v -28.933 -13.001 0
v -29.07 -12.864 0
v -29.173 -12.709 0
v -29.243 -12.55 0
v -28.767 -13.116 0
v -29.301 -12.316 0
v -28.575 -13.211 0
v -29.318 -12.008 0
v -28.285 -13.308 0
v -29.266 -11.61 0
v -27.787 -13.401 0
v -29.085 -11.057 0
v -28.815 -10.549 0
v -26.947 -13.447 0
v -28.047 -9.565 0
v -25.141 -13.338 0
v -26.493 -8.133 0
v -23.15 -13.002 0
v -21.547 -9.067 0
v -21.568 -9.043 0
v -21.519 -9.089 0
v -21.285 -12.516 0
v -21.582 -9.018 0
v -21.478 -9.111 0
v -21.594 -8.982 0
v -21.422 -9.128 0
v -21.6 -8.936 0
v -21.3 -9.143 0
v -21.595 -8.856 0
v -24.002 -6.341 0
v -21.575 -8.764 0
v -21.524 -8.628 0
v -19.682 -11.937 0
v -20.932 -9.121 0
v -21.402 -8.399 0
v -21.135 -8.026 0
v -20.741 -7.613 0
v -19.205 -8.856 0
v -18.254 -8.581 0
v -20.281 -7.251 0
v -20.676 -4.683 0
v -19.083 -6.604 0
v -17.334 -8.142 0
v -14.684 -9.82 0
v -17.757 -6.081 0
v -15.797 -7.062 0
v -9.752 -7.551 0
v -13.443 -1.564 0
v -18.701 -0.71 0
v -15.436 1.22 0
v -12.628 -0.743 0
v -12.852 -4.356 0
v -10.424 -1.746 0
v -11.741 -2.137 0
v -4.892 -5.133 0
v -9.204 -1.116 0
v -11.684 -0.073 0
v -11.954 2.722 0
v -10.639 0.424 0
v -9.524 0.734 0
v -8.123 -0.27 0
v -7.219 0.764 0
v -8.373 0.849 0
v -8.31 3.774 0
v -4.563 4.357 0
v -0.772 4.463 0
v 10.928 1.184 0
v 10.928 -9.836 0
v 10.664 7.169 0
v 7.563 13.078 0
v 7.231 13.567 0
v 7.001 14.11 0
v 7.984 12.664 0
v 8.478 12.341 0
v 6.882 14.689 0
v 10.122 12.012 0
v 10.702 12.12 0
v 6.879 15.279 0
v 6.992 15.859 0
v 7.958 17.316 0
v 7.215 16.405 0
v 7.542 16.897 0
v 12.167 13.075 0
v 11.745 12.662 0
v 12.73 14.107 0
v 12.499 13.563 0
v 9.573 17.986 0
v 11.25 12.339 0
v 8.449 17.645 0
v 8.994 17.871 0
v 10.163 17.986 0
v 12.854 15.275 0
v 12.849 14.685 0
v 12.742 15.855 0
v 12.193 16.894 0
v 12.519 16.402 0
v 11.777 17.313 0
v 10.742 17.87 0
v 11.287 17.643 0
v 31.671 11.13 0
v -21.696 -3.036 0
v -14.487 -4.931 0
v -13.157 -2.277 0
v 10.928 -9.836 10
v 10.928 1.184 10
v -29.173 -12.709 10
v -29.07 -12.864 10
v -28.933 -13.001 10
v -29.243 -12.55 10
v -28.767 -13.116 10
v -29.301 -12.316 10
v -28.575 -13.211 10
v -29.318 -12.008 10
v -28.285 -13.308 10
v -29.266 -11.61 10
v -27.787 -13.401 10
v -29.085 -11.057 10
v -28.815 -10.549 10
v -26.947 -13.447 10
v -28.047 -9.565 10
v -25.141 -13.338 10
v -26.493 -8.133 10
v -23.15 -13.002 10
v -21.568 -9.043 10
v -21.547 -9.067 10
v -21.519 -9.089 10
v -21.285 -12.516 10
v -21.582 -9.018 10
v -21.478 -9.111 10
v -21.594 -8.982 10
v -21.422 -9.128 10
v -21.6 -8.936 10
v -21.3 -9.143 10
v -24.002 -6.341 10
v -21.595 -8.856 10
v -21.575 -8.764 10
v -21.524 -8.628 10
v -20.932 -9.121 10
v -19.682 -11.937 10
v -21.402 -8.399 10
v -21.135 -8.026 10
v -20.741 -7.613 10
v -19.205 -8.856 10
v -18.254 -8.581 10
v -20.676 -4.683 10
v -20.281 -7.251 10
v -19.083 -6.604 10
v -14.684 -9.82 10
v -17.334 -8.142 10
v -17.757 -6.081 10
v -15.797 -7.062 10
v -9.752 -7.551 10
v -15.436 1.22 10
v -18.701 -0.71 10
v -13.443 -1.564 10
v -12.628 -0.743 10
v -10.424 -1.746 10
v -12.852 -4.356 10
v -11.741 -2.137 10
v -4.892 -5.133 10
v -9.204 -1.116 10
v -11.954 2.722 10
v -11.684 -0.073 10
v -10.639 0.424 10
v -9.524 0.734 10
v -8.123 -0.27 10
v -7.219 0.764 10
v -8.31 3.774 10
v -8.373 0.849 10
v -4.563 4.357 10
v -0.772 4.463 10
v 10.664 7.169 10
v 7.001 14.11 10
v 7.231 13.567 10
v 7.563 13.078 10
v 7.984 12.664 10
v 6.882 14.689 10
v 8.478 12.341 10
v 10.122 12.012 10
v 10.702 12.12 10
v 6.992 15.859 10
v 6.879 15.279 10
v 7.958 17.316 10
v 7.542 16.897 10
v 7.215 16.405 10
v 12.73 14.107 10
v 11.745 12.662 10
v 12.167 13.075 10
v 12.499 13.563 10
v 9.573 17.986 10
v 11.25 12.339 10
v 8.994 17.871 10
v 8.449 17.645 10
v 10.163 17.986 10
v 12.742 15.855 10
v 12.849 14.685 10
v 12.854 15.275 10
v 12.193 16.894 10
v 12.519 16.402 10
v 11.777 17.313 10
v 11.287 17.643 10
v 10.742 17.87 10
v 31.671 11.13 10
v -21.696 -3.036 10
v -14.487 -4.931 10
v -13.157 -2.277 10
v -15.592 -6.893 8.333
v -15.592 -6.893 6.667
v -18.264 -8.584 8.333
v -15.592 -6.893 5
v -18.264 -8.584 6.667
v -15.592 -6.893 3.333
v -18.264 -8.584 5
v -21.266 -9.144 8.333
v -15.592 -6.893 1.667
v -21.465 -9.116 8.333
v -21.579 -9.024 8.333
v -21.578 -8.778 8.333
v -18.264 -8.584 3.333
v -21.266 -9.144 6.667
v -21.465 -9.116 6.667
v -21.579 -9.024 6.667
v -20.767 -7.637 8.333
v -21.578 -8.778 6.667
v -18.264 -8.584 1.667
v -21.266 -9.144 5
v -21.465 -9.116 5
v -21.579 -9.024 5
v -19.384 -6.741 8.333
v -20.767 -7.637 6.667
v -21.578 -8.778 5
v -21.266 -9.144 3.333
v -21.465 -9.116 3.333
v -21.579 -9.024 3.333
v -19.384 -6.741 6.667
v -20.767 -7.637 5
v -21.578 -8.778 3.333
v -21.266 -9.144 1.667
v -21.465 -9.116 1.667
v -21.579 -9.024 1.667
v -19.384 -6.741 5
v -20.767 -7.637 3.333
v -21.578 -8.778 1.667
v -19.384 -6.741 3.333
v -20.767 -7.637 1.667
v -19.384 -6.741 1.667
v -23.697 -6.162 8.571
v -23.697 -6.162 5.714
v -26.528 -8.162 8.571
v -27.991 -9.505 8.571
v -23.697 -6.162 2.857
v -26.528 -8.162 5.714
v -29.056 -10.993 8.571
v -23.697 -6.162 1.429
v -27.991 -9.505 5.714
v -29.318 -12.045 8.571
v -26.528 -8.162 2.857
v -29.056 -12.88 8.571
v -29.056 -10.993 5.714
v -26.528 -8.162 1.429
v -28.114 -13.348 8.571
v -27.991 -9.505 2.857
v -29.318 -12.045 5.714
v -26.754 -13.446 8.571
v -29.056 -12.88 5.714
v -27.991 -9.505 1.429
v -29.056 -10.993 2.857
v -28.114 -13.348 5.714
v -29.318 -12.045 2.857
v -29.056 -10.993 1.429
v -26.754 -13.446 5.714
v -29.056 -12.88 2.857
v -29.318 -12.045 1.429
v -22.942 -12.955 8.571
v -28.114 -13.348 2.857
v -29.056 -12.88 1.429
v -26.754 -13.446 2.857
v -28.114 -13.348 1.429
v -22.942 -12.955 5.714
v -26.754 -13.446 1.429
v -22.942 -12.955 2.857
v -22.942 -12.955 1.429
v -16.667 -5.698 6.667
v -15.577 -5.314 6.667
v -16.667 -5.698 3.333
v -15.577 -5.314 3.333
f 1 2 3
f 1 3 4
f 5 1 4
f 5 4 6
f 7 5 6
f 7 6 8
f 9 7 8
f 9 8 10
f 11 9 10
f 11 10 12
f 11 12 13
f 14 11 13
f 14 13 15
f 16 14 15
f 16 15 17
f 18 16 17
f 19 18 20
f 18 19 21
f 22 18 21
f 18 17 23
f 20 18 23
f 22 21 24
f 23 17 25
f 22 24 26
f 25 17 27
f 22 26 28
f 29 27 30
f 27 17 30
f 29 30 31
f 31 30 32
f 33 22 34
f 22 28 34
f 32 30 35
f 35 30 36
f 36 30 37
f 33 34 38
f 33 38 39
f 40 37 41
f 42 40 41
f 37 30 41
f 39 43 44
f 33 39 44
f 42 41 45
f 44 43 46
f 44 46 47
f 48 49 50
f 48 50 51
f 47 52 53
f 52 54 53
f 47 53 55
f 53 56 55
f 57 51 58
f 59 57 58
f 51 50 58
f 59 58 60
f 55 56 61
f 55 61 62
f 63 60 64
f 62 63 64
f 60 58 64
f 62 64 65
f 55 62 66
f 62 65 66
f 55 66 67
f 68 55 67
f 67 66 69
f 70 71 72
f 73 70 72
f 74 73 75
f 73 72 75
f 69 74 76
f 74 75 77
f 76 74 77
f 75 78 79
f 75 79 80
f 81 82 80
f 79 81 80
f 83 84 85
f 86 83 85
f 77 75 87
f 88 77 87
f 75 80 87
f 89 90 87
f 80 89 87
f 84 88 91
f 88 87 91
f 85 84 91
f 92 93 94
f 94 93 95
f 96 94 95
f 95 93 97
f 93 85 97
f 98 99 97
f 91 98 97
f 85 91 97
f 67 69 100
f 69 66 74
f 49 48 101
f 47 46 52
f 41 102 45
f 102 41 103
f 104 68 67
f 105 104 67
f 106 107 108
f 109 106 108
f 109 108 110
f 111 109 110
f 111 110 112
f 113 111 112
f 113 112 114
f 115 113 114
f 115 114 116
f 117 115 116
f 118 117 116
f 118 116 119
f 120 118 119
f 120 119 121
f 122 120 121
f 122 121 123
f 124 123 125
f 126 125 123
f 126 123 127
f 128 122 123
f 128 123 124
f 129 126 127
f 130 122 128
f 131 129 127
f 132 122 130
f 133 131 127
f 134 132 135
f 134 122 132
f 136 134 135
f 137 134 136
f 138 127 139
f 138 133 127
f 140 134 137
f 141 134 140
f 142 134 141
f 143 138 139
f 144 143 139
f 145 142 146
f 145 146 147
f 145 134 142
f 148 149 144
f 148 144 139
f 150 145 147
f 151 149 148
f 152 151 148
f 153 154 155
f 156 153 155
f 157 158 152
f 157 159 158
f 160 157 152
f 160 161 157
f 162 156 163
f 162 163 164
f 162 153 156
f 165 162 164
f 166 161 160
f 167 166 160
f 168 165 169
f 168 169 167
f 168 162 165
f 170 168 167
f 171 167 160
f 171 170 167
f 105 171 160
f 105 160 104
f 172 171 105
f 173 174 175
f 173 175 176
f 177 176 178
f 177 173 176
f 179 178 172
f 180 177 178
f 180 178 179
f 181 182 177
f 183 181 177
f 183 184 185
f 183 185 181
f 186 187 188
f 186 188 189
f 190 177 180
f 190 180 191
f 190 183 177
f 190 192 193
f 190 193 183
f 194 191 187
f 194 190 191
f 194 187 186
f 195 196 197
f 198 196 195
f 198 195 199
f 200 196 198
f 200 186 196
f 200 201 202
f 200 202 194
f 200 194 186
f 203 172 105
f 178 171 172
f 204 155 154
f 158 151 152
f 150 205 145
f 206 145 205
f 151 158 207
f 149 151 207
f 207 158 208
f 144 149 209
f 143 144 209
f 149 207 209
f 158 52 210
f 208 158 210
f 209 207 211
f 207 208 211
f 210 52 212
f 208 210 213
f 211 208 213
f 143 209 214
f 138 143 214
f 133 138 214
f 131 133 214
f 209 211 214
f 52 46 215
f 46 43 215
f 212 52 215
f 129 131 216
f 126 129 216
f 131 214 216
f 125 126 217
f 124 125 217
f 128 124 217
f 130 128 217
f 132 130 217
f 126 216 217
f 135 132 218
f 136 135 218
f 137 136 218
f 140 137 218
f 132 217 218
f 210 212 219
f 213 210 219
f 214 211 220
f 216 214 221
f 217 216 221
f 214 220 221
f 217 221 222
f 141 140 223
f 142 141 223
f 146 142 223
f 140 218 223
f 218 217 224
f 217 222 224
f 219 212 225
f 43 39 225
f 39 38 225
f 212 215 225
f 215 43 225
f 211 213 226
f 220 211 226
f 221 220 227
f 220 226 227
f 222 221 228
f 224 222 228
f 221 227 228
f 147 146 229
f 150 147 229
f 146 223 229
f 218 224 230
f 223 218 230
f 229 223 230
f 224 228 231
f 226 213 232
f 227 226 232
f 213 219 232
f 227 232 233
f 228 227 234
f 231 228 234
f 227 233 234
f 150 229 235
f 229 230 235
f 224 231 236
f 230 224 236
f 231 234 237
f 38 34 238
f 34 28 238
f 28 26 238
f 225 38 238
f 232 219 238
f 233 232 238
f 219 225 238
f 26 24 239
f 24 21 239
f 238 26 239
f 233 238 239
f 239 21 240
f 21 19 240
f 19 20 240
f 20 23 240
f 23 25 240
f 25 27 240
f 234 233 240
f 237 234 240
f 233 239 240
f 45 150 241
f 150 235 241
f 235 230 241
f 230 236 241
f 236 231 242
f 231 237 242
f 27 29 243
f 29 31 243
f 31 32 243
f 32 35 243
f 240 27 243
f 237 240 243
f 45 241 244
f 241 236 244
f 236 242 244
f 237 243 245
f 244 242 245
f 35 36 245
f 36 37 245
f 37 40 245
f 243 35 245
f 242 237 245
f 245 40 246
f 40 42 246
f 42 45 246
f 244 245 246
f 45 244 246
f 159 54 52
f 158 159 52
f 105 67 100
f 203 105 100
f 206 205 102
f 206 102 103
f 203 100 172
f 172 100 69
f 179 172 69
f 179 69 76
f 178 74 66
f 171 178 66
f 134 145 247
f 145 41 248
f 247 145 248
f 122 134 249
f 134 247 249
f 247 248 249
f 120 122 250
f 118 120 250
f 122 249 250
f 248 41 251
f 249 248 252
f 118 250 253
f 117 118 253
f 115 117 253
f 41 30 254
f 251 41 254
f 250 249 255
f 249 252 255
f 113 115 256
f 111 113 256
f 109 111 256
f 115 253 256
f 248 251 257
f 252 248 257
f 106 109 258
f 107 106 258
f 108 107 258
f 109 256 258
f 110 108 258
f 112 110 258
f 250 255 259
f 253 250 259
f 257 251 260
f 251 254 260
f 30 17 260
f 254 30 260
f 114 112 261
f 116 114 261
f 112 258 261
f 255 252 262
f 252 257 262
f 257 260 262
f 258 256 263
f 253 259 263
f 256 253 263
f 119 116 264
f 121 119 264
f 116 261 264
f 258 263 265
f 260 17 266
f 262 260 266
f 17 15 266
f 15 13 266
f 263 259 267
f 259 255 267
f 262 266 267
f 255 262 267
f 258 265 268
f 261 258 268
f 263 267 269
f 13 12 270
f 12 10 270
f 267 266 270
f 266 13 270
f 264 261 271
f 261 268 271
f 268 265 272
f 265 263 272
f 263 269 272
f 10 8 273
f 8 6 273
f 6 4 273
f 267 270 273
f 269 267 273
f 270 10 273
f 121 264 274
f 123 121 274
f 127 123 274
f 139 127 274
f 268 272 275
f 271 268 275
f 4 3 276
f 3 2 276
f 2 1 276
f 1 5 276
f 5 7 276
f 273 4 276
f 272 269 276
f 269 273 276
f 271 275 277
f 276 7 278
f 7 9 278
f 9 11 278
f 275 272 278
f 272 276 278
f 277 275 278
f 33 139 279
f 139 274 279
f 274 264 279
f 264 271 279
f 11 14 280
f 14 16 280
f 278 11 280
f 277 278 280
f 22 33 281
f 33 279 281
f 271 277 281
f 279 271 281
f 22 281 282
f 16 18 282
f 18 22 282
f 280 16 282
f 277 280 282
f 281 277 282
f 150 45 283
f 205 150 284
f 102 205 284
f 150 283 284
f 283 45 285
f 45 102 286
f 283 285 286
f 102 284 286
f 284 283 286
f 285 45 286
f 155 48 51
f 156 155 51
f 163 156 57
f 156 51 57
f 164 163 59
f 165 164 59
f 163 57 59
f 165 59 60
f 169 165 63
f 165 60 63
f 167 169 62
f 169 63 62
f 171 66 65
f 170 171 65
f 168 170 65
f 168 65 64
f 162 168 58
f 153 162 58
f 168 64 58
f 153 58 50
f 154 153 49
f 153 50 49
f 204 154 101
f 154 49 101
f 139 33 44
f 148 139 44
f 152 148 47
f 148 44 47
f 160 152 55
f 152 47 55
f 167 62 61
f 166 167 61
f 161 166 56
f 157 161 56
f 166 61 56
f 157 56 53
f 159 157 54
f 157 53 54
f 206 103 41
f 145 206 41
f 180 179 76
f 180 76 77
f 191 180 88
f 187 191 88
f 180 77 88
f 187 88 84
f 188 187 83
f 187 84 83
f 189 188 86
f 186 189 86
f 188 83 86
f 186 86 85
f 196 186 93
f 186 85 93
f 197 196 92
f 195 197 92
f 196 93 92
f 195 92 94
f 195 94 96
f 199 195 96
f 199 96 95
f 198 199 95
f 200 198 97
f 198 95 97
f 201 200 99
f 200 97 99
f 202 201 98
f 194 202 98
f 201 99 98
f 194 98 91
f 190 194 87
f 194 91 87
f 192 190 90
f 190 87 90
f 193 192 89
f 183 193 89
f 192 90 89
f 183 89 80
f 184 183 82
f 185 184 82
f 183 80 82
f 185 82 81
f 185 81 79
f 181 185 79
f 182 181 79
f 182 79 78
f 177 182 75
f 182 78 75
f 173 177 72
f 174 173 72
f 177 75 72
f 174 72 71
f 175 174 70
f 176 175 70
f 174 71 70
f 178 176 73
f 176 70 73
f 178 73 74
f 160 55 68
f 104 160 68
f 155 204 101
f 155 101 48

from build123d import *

# Parameters (mm, degrees)
F1_DEPTH = 10


with BuildPart() as f1:
    # F0 (on Top) → F1 (new body)
    with BuildSketch(Plane.XY):
        with BuildLine():
            Line((8.478207631, 12.3410948754), (-0.7716447129, 4.4630723743))
            ThreePointArc((-0.7716447129, 4.4630723743), (-11.9538408238, 2.7223708892), (-21.6962108707, -3.0359081413))
            Line((-21.6962108707, -3.0359081413), (-13.4434893382, -1.5644171497))
            ThreePointArc((-13.4434893382, -1.5644171497), (-10.6393236092, 0.4238918783), (-7.2186087971, 0.7636394335))
            ThreePointArc((-7.2186087971, 0.7636394335), (-9.2041796913, -1.1162314275), (-11.7406081274, -2.1374743066))
            Line((-11.7406081274, -2.1374743066), (-12.8516519005, -4.3556968285))
            add(Edge.make_bspline(
                [(-12.8516519005, -4.3556968285), (-13.7568916342, -5.2365663524), (-15.4952149852, -6.9280918184), (-18.1000884601, -8.7839051211), (-20.5113942152, -9.0591117823), (-21.9850725902, -9.2691445705), (-20.745626651, -7.1945055447), (-18.868340283, -6.495085517), (-17.7566145109, -6.0808901744)],
                knots=[0, 0, 0, 0, 0.2069867198, 0.3974746523, 0.566423919, 0.6670254821, 0.8028130608, 1, 1, 1, 1], degree=3))
            add(Edge.make_bspline(
                [(-17.7566145109, -6.0808901744), (-16.6666228197, -5.6975138753), (-15.5766311285, -5.3141375762), (-14.4866394373, -4.9307612771)],
                knots=[0, 0, 0, 0, 3.4663429522, 3.4663429522, 3.4663429522, 3.4663429522], degree=3))
            Line((-14.4866394373, -4.9307612771), (-13.1572225625, -2.2765522135))
            Line((-13.1572225625, -2.2765522135), (-20.6759641441, -4.6826065459))
            add(Edge.make_bspline(
                [(-20.6759641441, -4.6826065459), (-21.6949960064, -5.1413180449), (-23.7893254622, -6.0842111683), (-26.5134455561, -8.0502545567), (-29.3349164644, -10.6659635913), (-29.4655953345, -13.2765924141), (-26.5513052044, -13.5797258028), (-22.9693722214, -13.0632618836), (-20.6006690632, -12.3292936437), (-19.6821269664, -11.937062042)],
                knots=[0, 0, 0, 0, 0.1483192347, 0.2988701954, 0.4564156656, 0.5675018666, 0.6920148357, 0.8505478815, 1, 1, 1, 1], degree=3))
            ThreePointArc((-19.6821269664, -11.937062042), (-12.2092242102, -8.7042525804), (-4.8919349, -5.133172944))
            Line((-4.8919349, -5.133172944), (10.9284820036, -9.8356416623))
            Line((10.9284820036, -9.8356416623), (10.9284820036, 1.1840370476))
            Line((10.9284820036, 1.1840370476), (31.6714221652, 11.1300866483))
            Line((31.6714221652, 11.1300866483), (10.6644276728, 7.1692703639))
            Line((10.6644276728, 7.1692703639), (10.1219221884, 12.011635341))
            ThreePointArc((10.1219221884, 12.011635341), (10.4557474141, 17.9422087335), (8.478207631, 12.3410948754))
        make_face()
    extrude(amount=F1_DEPTH)


solid = f1.part
